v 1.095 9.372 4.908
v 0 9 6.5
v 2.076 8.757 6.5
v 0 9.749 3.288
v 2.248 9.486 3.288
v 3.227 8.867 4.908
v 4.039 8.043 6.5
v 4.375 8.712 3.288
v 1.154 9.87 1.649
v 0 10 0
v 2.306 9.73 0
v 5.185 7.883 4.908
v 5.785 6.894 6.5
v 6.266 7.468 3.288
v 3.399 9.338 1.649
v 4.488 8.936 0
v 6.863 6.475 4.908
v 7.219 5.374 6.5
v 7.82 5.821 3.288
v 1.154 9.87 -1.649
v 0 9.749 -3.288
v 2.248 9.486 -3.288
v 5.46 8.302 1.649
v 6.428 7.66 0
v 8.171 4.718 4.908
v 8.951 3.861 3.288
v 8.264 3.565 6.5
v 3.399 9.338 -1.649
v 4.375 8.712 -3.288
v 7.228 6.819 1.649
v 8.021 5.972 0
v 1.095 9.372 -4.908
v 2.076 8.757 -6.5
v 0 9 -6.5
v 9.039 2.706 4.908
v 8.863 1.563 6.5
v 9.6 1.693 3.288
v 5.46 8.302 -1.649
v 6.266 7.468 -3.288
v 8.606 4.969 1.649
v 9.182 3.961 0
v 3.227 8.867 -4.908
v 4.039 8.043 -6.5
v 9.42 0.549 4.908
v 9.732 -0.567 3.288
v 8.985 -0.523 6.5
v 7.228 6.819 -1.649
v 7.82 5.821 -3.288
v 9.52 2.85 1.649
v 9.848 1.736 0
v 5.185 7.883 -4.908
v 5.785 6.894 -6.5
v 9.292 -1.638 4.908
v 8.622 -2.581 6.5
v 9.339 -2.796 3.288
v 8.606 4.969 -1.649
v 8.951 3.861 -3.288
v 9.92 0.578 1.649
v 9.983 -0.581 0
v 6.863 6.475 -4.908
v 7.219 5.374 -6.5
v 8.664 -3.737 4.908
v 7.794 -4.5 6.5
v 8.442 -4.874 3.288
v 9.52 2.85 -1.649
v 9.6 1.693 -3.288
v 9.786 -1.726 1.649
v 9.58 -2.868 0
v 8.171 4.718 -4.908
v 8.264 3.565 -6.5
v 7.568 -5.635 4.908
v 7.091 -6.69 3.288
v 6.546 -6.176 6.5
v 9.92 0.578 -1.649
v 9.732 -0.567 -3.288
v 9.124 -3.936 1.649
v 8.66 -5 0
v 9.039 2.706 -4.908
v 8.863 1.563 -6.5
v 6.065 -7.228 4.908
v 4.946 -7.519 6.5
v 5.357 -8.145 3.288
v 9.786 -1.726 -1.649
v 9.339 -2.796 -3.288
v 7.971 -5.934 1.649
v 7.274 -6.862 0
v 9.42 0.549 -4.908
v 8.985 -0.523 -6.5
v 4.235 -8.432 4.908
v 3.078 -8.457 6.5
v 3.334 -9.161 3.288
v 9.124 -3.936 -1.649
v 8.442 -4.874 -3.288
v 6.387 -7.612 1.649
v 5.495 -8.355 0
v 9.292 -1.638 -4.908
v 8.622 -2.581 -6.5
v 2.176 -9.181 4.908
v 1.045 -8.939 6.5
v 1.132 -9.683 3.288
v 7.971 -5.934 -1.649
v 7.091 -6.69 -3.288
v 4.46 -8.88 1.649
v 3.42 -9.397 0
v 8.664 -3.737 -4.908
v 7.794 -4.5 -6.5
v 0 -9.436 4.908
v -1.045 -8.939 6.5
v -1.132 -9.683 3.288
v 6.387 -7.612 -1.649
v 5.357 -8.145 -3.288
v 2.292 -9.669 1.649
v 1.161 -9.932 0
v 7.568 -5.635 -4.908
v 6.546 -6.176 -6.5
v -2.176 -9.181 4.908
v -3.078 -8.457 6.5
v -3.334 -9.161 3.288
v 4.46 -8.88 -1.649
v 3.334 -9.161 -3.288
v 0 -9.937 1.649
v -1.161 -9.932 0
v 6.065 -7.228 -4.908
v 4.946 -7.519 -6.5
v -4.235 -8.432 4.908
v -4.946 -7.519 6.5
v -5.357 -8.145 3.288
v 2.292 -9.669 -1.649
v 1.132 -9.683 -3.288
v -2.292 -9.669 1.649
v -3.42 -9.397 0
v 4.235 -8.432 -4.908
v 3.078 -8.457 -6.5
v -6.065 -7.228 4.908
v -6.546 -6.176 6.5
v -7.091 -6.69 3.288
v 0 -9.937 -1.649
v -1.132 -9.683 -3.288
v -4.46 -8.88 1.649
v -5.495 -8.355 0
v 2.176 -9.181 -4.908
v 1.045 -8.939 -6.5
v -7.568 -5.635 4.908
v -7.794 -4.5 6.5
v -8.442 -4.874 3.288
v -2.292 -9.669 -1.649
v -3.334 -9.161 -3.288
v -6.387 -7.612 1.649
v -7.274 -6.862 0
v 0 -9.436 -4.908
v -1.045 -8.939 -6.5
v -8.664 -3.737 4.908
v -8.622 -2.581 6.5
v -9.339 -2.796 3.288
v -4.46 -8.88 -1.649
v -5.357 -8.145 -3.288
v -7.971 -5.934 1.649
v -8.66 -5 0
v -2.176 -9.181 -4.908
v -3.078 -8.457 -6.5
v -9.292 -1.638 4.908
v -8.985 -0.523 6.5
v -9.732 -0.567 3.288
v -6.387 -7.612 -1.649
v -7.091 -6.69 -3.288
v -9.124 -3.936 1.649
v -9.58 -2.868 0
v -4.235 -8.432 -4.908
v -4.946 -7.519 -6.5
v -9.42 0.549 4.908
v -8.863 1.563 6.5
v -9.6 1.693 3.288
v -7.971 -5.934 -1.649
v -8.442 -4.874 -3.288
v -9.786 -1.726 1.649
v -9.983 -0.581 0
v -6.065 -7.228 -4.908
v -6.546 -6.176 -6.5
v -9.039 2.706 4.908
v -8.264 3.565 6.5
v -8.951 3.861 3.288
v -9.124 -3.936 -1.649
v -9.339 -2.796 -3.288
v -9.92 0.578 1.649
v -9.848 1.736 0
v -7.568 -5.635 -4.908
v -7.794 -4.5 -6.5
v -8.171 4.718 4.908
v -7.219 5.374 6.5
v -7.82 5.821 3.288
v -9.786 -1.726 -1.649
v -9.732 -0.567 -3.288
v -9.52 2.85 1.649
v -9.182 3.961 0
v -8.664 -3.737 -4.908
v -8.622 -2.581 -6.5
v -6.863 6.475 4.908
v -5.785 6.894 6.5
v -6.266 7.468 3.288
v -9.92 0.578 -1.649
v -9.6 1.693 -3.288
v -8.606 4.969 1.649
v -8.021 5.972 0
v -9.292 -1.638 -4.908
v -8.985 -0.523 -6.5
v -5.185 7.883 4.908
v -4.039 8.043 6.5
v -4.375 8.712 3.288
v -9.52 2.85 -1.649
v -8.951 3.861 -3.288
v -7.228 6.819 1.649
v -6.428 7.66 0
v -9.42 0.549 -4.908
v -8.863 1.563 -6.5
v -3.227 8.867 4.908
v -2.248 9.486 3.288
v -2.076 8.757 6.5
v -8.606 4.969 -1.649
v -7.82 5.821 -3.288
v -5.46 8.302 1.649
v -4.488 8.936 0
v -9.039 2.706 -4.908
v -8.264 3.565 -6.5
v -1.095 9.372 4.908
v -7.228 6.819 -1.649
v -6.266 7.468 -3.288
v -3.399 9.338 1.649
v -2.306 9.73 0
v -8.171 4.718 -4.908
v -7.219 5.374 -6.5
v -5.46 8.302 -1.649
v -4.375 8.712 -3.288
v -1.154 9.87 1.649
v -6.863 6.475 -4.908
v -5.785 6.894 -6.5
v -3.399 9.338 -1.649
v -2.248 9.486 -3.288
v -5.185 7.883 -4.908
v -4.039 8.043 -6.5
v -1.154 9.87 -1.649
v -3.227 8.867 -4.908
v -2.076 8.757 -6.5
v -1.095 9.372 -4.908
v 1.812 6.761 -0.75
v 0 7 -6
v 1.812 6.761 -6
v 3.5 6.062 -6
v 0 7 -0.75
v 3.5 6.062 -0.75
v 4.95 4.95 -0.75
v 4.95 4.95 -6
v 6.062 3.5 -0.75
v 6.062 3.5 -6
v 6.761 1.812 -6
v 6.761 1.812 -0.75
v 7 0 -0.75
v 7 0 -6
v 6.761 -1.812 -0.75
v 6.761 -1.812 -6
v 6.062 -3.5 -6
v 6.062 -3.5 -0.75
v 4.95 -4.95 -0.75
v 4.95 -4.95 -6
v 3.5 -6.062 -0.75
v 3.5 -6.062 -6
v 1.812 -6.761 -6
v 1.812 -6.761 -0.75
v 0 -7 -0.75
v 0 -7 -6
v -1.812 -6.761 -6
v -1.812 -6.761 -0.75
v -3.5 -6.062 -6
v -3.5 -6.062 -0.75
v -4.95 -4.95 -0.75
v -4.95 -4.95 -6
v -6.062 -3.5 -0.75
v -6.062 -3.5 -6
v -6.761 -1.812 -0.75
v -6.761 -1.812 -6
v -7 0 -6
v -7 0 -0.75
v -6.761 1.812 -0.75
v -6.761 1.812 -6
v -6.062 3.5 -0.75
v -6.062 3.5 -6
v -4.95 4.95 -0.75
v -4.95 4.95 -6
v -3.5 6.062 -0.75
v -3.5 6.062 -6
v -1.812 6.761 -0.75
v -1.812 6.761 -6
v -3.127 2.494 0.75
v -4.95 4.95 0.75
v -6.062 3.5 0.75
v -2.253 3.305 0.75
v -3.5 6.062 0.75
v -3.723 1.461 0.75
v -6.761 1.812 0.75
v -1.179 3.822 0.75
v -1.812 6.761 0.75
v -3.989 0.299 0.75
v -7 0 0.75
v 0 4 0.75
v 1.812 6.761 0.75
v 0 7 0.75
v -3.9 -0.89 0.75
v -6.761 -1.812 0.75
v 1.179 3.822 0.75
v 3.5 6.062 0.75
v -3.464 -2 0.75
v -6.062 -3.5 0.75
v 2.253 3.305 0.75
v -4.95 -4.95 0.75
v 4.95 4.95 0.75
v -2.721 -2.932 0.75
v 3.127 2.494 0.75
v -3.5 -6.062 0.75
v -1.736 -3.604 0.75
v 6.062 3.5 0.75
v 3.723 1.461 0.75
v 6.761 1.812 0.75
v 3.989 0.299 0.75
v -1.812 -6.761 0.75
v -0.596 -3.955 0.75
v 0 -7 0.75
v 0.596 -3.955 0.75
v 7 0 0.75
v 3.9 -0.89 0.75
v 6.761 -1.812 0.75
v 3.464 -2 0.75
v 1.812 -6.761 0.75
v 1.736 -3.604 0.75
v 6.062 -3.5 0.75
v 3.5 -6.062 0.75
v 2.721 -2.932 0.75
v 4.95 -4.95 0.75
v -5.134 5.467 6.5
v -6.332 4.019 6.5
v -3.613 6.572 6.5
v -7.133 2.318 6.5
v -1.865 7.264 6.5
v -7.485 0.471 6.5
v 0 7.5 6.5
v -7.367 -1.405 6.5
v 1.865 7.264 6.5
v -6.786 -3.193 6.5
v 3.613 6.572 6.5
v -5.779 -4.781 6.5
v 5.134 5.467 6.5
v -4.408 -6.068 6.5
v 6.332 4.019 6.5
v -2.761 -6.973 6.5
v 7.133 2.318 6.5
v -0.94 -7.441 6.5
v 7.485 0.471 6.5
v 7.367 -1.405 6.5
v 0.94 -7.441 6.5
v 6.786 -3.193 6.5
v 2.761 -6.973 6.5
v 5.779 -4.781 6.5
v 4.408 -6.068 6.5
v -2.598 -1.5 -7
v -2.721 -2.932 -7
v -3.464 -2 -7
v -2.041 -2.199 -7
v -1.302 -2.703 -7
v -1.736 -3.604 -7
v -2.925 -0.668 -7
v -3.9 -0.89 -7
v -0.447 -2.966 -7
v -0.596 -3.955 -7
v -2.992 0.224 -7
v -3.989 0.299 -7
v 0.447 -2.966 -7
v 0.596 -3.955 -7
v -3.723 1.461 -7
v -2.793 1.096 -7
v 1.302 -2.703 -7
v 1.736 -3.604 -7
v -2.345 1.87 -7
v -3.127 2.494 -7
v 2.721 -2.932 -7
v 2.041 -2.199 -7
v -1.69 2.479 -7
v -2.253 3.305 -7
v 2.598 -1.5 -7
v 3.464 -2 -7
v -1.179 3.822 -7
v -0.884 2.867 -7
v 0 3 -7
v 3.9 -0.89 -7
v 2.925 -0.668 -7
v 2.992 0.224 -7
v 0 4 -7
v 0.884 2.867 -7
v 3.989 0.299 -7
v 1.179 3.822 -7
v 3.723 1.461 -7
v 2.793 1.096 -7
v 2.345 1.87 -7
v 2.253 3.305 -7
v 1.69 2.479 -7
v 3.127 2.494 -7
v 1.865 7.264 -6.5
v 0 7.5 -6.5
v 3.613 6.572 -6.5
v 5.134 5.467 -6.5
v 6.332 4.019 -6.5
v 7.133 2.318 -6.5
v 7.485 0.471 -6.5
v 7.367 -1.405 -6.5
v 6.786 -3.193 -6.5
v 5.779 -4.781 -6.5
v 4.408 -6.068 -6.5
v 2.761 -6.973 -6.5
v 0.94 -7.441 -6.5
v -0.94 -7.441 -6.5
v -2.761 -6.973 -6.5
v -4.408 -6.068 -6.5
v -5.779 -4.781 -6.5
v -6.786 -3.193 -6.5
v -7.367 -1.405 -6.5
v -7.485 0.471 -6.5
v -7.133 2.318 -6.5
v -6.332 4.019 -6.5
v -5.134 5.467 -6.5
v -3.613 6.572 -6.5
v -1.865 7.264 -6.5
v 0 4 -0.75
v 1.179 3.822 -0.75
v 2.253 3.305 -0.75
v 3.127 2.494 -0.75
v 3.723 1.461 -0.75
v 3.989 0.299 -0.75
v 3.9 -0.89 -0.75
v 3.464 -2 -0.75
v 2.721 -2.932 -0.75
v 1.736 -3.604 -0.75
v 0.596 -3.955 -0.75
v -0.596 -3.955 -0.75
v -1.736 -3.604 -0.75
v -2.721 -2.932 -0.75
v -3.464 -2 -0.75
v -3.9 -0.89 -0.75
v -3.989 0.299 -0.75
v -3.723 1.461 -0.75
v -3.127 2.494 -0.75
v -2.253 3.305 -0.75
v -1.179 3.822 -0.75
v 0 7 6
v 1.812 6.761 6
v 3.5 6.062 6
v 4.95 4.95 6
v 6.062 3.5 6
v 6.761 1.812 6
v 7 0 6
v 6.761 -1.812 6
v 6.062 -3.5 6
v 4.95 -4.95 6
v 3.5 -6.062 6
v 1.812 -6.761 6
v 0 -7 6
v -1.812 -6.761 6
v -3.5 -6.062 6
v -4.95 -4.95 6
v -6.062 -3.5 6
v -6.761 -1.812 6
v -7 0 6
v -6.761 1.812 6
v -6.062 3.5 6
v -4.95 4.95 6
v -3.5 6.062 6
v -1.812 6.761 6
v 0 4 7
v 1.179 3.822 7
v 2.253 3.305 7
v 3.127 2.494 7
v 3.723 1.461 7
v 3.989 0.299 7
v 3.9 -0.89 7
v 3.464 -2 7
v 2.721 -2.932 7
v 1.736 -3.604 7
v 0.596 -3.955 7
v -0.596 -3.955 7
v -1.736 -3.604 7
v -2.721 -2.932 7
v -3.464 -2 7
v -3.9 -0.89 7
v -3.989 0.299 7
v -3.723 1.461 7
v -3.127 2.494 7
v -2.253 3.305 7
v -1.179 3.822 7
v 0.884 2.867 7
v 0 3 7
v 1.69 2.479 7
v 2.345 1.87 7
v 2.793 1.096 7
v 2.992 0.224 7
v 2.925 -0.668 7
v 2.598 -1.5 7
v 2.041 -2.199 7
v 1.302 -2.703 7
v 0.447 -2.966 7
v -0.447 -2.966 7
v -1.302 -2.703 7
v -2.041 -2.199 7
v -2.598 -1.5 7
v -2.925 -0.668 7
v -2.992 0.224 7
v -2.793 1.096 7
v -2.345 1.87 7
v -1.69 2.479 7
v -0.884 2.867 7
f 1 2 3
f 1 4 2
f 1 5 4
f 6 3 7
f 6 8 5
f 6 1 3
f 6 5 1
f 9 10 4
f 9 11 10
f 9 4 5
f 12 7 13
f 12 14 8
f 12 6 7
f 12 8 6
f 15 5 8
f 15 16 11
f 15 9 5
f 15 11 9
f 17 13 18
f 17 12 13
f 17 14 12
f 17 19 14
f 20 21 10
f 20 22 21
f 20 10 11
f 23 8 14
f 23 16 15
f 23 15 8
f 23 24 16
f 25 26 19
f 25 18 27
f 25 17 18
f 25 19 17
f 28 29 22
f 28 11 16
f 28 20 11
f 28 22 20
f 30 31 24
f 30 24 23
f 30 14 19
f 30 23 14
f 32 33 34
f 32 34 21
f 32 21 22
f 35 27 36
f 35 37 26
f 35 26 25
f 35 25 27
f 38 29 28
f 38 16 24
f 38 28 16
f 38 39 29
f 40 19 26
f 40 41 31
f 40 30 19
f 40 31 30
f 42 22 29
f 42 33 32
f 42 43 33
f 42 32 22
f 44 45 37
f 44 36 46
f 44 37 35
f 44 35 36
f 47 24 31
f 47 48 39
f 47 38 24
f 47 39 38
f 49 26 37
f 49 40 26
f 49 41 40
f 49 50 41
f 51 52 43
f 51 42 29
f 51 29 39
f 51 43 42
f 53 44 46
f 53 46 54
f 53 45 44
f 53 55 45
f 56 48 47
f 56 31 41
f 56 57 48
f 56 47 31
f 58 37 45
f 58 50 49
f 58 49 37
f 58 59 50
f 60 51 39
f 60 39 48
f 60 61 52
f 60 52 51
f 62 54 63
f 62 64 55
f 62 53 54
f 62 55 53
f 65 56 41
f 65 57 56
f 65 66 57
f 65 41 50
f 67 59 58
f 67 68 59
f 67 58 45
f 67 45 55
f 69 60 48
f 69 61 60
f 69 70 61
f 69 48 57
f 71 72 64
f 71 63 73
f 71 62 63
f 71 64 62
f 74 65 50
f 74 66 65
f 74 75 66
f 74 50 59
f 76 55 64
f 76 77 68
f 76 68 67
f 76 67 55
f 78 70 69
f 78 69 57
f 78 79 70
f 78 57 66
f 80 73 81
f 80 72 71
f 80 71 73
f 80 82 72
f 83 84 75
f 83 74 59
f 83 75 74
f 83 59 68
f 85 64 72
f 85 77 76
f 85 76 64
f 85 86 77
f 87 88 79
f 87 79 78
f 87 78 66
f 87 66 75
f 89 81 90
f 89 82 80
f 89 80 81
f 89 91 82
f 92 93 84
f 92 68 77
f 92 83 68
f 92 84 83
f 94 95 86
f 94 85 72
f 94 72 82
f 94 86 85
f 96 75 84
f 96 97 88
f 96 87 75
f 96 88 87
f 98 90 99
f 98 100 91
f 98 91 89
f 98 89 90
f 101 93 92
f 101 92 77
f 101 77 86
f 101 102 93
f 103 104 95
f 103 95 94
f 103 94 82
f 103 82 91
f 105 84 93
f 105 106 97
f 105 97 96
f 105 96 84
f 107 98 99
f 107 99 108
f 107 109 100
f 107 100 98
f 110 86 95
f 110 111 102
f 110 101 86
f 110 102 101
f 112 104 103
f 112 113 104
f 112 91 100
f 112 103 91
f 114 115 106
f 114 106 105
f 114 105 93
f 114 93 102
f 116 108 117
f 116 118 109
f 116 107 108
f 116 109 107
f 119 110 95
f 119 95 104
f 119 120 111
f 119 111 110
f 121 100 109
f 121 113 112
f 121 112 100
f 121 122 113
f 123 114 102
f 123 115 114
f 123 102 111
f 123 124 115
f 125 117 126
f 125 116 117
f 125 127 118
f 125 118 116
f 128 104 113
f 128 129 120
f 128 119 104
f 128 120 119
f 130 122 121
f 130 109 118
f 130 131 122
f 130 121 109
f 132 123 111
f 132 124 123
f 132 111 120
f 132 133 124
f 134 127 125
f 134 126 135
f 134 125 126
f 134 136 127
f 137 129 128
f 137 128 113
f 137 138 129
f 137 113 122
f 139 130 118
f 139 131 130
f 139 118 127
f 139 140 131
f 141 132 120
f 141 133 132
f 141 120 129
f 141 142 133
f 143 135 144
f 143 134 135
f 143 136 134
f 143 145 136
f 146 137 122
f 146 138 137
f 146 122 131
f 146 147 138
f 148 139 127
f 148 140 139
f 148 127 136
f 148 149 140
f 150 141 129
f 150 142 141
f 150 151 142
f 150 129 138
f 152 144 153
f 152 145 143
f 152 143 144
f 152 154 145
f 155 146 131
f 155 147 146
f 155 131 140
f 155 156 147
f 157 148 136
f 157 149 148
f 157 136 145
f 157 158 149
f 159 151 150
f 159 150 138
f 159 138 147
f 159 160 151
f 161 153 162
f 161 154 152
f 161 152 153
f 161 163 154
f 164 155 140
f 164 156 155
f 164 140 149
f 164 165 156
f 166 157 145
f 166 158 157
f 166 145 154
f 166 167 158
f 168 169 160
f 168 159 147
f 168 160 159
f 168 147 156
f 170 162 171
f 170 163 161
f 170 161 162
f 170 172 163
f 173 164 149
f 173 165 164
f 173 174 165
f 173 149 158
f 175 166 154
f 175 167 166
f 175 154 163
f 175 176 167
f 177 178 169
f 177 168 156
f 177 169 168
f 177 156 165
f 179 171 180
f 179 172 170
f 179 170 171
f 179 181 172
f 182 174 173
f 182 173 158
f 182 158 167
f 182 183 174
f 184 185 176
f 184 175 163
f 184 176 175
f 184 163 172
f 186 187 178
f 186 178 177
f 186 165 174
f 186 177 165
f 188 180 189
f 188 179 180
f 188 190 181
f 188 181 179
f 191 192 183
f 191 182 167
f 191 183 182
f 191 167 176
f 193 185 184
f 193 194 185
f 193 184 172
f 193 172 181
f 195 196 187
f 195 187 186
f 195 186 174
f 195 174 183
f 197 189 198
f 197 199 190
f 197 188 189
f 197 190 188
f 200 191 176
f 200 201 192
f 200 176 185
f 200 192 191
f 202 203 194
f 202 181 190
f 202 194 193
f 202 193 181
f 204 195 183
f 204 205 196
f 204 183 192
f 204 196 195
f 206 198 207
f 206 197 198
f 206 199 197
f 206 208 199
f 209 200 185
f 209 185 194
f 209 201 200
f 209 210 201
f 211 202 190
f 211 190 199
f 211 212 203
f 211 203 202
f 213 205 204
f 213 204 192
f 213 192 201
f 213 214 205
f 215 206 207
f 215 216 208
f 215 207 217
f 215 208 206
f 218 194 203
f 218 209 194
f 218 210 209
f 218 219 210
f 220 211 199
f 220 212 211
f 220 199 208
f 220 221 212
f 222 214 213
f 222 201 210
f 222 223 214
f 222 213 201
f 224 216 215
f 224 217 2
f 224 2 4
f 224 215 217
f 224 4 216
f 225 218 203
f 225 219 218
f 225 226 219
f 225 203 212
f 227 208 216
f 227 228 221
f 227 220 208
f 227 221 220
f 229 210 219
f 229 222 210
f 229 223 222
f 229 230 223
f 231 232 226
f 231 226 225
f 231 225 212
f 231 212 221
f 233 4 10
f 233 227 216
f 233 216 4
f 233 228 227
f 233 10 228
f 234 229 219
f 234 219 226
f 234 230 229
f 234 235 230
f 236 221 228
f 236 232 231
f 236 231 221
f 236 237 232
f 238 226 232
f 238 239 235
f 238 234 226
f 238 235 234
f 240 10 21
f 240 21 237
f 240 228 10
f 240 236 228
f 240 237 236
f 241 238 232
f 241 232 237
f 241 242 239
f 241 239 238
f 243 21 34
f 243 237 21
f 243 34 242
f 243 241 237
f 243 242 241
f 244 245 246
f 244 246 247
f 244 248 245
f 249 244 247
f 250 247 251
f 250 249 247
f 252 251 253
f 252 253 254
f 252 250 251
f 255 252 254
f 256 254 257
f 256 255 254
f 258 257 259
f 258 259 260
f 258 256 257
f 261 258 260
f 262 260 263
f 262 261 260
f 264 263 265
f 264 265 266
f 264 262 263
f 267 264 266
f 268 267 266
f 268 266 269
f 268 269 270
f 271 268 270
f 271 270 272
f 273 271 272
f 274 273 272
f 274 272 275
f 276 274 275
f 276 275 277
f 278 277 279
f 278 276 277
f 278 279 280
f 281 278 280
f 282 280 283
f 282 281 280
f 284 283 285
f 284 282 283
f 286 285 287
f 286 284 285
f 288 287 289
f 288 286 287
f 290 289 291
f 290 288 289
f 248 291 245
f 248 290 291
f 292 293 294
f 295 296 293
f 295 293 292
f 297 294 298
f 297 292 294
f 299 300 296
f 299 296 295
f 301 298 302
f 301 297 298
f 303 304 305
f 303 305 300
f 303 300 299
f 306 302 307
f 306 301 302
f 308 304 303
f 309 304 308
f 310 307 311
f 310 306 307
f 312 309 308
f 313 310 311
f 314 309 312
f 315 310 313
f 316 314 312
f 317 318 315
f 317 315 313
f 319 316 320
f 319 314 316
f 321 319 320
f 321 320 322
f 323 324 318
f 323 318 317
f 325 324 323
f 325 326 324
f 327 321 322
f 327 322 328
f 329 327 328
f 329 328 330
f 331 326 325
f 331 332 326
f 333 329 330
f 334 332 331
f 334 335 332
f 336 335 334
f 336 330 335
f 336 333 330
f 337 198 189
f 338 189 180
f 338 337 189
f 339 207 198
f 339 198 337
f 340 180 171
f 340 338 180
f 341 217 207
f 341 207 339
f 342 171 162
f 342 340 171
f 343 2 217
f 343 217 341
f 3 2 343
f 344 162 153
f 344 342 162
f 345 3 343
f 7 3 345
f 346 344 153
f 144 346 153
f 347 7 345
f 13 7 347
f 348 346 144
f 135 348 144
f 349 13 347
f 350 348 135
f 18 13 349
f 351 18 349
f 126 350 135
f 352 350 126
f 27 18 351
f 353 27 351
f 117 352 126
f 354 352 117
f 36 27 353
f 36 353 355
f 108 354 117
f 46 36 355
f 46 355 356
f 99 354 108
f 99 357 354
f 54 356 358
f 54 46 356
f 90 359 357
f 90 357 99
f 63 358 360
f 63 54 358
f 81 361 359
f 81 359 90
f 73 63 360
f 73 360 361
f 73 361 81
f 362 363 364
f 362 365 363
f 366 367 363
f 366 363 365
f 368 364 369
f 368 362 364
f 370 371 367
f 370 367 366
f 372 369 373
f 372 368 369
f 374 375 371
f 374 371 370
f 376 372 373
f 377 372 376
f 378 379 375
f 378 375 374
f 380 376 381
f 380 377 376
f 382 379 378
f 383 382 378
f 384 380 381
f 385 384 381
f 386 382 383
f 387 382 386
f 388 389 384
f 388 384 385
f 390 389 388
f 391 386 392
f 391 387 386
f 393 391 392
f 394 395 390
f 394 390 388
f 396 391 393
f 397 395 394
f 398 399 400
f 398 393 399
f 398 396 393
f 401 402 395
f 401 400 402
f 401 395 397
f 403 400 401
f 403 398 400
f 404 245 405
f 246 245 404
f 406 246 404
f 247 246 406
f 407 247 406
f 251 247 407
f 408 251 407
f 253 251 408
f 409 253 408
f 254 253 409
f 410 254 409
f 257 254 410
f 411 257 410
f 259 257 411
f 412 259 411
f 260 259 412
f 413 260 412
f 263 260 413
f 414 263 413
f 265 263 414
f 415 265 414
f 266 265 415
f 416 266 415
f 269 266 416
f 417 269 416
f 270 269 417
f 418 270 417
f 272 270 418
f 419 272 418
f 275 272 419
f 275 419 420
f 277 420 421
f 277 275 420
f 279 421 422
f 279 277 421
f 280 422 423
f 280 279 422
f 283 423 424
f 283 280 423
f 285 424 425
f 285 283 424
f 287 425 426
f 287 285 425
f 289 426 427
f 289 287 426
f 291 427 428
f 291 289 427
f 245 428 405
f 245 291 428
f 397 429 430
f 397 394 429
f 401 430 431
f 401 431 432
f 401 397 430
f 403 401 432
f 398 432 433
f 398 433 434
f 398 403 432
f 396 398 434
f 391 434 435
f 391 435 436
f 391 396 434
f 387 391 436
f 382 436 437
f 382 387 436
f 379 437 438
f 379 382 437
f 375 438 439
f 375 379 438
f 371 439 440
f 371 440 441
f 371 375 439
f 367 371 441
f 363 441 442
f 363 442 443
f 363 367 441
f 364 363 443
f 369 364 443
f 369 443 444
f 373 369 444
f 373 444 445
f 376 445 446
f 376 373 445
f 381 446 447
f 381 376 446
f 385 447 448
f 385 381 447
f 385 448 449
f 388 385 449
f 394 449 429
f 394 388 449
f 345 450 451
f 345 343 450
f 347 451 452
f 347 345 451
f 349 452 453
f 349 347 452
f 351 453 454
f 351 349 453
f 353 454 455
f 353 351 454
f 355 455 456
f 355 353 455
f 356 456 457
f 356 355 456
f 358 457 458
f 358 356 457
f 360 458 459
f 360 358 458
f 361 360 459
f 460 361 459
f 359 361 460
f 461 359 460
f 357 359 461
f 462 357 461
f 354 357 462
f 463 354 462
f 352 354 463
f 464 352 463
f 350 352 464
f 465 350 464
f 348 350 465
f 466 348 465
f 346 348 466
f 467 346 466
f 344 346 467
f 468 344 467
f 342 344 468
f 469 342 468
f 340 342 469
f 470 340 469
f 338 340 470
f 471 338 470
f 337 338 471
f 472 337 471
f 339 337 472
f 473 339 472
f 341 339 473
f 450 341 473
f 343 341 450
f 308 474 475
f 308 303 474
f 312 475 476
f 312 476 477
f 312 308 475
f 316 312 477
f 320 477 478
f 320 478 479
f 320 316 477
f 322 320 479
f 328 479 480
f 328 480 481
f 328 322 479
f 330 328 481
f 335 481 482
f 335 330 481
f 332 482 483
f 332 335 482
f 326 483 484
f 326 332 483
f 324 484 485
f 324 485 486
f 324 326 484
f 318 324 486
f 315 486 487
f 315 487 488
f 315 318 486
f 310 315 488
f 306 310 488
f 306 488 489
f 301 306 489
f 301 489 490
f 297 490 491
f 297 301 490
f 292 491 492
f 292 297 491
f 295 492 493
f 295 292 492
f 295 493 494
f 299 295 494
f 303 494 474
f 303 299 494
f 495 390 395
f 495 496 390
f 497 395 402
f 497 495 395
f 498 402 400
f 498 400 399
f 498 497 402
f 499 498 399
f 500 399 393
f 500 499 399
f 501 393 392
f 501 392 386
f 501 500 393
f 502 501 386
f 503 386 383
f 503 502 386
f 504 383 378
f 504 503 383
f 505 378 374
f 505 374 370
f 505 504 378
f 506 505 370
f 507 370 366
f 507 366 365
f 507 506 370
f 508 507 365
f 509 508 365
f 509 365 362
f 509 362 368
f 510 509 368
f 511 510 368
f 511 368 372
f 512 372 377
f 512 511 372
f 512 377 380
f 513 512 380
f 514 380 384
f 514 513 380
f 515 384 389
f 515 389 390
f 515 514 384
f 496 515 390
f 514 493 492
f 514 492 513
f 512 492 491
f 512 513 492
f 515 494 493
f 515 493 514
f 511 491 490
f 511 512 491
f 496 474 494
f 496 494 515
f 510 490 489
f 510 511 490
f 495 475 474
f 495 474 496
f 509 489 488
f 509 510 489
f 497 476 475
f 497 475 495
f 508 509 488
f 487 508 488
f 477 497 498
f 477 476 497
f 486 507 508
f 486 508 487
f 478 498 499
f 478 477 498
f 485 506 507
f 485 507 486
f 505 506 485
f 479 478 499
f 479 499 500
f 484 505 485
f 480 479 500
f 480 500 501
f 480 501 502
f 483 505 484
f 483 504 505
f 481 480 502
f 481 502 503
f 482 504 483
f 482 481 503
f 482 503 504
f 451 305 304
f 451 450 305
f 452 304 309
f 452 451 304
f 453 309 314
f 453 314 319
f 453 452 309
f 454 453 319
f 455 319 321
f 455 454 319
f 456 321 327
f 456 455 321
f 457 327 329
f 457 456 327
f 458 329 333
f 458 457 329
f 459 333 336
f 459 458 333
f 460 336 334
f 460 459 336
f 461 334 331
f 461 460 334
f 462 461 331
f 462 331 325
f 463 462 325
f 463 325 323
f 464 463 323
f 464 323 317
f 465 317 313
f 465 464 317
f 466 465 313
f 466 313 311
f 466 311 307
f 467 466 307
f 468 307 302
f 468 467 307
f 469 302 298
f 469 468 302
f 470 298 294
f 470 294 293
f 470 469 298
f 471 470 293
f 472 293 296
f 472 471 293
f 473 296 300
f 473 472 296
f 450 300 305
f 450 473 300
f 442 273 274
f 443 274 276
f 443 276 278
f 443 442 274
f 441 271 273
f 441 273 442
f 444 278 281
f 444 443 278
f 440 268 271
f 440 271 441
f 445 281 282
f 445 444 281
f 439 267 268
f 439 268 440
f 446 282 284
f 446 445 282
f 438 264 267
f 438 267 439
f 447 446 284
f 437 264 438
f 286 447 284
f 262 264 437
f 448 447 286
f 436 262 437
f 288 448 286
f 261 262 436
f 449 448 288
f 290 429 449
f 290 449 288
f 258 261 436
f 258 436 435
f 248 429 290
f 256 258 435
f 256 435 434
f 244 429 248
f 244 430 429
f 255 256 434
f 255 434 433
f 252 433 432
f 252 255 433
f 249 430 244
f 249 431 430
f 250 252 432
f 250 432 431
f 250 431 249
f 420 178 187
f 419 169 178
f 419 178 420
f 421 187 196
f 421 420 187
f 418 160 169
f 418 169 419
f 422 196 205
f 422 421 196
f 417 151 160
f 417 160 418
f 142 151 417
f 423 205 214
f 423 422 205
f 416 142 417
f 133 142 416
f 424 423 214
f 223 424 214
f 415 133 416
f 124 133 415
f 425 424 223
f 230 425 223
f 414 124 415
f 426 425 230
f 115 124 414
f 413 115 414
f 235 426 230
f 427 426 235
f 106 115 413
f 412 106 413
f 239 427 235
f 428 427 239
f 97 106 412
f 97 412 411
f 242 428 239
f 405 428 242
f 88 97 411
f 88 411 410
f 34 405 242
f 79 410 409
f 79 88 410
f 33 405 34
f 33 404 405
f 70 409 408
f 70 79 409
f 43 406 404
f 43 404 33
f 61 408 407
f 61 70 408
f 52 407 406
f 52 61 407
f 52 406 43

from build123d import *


with BuildPart() as part:
    # Esquisse1 → Révolution1 (revolve)
    with BuildSketch(Plane(origin=(0, 0, 0), x_dir=(0, 0, -1), z_dir=(1, 0, 0))):
        with BuildLine():
            Line((7, 3), (-7, 3))
            Line((-7, 3), (-7, 4))
            Line((-7, 4), (-0.75, 4))
            Line((-0.75, 4), (-0.75, 7))
            Line((-0.75, 7), (-6, 7))
            Line((-6, 7), (-6.5, 7.5))
            Line((-6.5, 7.5), (-6.5, 9))
            ThreePointArc((-6.5, 9), (0, 10), (6.5, 9))
            Line((6.5, 9), (6.5, 7.5))
            Line((6.5, 7.5), (6, 7))
            Line((6, 7), (0.75, 7))
            Line((0.75, 7), (0.75, 4))
            Line((0.75, 4), (7, 4))
            Line((7, 4), (7, 3))
        make_face()
    revolve(axis=Axis((0, 0, 4.7147115), (0, 0, -1)))


solid = part.part
